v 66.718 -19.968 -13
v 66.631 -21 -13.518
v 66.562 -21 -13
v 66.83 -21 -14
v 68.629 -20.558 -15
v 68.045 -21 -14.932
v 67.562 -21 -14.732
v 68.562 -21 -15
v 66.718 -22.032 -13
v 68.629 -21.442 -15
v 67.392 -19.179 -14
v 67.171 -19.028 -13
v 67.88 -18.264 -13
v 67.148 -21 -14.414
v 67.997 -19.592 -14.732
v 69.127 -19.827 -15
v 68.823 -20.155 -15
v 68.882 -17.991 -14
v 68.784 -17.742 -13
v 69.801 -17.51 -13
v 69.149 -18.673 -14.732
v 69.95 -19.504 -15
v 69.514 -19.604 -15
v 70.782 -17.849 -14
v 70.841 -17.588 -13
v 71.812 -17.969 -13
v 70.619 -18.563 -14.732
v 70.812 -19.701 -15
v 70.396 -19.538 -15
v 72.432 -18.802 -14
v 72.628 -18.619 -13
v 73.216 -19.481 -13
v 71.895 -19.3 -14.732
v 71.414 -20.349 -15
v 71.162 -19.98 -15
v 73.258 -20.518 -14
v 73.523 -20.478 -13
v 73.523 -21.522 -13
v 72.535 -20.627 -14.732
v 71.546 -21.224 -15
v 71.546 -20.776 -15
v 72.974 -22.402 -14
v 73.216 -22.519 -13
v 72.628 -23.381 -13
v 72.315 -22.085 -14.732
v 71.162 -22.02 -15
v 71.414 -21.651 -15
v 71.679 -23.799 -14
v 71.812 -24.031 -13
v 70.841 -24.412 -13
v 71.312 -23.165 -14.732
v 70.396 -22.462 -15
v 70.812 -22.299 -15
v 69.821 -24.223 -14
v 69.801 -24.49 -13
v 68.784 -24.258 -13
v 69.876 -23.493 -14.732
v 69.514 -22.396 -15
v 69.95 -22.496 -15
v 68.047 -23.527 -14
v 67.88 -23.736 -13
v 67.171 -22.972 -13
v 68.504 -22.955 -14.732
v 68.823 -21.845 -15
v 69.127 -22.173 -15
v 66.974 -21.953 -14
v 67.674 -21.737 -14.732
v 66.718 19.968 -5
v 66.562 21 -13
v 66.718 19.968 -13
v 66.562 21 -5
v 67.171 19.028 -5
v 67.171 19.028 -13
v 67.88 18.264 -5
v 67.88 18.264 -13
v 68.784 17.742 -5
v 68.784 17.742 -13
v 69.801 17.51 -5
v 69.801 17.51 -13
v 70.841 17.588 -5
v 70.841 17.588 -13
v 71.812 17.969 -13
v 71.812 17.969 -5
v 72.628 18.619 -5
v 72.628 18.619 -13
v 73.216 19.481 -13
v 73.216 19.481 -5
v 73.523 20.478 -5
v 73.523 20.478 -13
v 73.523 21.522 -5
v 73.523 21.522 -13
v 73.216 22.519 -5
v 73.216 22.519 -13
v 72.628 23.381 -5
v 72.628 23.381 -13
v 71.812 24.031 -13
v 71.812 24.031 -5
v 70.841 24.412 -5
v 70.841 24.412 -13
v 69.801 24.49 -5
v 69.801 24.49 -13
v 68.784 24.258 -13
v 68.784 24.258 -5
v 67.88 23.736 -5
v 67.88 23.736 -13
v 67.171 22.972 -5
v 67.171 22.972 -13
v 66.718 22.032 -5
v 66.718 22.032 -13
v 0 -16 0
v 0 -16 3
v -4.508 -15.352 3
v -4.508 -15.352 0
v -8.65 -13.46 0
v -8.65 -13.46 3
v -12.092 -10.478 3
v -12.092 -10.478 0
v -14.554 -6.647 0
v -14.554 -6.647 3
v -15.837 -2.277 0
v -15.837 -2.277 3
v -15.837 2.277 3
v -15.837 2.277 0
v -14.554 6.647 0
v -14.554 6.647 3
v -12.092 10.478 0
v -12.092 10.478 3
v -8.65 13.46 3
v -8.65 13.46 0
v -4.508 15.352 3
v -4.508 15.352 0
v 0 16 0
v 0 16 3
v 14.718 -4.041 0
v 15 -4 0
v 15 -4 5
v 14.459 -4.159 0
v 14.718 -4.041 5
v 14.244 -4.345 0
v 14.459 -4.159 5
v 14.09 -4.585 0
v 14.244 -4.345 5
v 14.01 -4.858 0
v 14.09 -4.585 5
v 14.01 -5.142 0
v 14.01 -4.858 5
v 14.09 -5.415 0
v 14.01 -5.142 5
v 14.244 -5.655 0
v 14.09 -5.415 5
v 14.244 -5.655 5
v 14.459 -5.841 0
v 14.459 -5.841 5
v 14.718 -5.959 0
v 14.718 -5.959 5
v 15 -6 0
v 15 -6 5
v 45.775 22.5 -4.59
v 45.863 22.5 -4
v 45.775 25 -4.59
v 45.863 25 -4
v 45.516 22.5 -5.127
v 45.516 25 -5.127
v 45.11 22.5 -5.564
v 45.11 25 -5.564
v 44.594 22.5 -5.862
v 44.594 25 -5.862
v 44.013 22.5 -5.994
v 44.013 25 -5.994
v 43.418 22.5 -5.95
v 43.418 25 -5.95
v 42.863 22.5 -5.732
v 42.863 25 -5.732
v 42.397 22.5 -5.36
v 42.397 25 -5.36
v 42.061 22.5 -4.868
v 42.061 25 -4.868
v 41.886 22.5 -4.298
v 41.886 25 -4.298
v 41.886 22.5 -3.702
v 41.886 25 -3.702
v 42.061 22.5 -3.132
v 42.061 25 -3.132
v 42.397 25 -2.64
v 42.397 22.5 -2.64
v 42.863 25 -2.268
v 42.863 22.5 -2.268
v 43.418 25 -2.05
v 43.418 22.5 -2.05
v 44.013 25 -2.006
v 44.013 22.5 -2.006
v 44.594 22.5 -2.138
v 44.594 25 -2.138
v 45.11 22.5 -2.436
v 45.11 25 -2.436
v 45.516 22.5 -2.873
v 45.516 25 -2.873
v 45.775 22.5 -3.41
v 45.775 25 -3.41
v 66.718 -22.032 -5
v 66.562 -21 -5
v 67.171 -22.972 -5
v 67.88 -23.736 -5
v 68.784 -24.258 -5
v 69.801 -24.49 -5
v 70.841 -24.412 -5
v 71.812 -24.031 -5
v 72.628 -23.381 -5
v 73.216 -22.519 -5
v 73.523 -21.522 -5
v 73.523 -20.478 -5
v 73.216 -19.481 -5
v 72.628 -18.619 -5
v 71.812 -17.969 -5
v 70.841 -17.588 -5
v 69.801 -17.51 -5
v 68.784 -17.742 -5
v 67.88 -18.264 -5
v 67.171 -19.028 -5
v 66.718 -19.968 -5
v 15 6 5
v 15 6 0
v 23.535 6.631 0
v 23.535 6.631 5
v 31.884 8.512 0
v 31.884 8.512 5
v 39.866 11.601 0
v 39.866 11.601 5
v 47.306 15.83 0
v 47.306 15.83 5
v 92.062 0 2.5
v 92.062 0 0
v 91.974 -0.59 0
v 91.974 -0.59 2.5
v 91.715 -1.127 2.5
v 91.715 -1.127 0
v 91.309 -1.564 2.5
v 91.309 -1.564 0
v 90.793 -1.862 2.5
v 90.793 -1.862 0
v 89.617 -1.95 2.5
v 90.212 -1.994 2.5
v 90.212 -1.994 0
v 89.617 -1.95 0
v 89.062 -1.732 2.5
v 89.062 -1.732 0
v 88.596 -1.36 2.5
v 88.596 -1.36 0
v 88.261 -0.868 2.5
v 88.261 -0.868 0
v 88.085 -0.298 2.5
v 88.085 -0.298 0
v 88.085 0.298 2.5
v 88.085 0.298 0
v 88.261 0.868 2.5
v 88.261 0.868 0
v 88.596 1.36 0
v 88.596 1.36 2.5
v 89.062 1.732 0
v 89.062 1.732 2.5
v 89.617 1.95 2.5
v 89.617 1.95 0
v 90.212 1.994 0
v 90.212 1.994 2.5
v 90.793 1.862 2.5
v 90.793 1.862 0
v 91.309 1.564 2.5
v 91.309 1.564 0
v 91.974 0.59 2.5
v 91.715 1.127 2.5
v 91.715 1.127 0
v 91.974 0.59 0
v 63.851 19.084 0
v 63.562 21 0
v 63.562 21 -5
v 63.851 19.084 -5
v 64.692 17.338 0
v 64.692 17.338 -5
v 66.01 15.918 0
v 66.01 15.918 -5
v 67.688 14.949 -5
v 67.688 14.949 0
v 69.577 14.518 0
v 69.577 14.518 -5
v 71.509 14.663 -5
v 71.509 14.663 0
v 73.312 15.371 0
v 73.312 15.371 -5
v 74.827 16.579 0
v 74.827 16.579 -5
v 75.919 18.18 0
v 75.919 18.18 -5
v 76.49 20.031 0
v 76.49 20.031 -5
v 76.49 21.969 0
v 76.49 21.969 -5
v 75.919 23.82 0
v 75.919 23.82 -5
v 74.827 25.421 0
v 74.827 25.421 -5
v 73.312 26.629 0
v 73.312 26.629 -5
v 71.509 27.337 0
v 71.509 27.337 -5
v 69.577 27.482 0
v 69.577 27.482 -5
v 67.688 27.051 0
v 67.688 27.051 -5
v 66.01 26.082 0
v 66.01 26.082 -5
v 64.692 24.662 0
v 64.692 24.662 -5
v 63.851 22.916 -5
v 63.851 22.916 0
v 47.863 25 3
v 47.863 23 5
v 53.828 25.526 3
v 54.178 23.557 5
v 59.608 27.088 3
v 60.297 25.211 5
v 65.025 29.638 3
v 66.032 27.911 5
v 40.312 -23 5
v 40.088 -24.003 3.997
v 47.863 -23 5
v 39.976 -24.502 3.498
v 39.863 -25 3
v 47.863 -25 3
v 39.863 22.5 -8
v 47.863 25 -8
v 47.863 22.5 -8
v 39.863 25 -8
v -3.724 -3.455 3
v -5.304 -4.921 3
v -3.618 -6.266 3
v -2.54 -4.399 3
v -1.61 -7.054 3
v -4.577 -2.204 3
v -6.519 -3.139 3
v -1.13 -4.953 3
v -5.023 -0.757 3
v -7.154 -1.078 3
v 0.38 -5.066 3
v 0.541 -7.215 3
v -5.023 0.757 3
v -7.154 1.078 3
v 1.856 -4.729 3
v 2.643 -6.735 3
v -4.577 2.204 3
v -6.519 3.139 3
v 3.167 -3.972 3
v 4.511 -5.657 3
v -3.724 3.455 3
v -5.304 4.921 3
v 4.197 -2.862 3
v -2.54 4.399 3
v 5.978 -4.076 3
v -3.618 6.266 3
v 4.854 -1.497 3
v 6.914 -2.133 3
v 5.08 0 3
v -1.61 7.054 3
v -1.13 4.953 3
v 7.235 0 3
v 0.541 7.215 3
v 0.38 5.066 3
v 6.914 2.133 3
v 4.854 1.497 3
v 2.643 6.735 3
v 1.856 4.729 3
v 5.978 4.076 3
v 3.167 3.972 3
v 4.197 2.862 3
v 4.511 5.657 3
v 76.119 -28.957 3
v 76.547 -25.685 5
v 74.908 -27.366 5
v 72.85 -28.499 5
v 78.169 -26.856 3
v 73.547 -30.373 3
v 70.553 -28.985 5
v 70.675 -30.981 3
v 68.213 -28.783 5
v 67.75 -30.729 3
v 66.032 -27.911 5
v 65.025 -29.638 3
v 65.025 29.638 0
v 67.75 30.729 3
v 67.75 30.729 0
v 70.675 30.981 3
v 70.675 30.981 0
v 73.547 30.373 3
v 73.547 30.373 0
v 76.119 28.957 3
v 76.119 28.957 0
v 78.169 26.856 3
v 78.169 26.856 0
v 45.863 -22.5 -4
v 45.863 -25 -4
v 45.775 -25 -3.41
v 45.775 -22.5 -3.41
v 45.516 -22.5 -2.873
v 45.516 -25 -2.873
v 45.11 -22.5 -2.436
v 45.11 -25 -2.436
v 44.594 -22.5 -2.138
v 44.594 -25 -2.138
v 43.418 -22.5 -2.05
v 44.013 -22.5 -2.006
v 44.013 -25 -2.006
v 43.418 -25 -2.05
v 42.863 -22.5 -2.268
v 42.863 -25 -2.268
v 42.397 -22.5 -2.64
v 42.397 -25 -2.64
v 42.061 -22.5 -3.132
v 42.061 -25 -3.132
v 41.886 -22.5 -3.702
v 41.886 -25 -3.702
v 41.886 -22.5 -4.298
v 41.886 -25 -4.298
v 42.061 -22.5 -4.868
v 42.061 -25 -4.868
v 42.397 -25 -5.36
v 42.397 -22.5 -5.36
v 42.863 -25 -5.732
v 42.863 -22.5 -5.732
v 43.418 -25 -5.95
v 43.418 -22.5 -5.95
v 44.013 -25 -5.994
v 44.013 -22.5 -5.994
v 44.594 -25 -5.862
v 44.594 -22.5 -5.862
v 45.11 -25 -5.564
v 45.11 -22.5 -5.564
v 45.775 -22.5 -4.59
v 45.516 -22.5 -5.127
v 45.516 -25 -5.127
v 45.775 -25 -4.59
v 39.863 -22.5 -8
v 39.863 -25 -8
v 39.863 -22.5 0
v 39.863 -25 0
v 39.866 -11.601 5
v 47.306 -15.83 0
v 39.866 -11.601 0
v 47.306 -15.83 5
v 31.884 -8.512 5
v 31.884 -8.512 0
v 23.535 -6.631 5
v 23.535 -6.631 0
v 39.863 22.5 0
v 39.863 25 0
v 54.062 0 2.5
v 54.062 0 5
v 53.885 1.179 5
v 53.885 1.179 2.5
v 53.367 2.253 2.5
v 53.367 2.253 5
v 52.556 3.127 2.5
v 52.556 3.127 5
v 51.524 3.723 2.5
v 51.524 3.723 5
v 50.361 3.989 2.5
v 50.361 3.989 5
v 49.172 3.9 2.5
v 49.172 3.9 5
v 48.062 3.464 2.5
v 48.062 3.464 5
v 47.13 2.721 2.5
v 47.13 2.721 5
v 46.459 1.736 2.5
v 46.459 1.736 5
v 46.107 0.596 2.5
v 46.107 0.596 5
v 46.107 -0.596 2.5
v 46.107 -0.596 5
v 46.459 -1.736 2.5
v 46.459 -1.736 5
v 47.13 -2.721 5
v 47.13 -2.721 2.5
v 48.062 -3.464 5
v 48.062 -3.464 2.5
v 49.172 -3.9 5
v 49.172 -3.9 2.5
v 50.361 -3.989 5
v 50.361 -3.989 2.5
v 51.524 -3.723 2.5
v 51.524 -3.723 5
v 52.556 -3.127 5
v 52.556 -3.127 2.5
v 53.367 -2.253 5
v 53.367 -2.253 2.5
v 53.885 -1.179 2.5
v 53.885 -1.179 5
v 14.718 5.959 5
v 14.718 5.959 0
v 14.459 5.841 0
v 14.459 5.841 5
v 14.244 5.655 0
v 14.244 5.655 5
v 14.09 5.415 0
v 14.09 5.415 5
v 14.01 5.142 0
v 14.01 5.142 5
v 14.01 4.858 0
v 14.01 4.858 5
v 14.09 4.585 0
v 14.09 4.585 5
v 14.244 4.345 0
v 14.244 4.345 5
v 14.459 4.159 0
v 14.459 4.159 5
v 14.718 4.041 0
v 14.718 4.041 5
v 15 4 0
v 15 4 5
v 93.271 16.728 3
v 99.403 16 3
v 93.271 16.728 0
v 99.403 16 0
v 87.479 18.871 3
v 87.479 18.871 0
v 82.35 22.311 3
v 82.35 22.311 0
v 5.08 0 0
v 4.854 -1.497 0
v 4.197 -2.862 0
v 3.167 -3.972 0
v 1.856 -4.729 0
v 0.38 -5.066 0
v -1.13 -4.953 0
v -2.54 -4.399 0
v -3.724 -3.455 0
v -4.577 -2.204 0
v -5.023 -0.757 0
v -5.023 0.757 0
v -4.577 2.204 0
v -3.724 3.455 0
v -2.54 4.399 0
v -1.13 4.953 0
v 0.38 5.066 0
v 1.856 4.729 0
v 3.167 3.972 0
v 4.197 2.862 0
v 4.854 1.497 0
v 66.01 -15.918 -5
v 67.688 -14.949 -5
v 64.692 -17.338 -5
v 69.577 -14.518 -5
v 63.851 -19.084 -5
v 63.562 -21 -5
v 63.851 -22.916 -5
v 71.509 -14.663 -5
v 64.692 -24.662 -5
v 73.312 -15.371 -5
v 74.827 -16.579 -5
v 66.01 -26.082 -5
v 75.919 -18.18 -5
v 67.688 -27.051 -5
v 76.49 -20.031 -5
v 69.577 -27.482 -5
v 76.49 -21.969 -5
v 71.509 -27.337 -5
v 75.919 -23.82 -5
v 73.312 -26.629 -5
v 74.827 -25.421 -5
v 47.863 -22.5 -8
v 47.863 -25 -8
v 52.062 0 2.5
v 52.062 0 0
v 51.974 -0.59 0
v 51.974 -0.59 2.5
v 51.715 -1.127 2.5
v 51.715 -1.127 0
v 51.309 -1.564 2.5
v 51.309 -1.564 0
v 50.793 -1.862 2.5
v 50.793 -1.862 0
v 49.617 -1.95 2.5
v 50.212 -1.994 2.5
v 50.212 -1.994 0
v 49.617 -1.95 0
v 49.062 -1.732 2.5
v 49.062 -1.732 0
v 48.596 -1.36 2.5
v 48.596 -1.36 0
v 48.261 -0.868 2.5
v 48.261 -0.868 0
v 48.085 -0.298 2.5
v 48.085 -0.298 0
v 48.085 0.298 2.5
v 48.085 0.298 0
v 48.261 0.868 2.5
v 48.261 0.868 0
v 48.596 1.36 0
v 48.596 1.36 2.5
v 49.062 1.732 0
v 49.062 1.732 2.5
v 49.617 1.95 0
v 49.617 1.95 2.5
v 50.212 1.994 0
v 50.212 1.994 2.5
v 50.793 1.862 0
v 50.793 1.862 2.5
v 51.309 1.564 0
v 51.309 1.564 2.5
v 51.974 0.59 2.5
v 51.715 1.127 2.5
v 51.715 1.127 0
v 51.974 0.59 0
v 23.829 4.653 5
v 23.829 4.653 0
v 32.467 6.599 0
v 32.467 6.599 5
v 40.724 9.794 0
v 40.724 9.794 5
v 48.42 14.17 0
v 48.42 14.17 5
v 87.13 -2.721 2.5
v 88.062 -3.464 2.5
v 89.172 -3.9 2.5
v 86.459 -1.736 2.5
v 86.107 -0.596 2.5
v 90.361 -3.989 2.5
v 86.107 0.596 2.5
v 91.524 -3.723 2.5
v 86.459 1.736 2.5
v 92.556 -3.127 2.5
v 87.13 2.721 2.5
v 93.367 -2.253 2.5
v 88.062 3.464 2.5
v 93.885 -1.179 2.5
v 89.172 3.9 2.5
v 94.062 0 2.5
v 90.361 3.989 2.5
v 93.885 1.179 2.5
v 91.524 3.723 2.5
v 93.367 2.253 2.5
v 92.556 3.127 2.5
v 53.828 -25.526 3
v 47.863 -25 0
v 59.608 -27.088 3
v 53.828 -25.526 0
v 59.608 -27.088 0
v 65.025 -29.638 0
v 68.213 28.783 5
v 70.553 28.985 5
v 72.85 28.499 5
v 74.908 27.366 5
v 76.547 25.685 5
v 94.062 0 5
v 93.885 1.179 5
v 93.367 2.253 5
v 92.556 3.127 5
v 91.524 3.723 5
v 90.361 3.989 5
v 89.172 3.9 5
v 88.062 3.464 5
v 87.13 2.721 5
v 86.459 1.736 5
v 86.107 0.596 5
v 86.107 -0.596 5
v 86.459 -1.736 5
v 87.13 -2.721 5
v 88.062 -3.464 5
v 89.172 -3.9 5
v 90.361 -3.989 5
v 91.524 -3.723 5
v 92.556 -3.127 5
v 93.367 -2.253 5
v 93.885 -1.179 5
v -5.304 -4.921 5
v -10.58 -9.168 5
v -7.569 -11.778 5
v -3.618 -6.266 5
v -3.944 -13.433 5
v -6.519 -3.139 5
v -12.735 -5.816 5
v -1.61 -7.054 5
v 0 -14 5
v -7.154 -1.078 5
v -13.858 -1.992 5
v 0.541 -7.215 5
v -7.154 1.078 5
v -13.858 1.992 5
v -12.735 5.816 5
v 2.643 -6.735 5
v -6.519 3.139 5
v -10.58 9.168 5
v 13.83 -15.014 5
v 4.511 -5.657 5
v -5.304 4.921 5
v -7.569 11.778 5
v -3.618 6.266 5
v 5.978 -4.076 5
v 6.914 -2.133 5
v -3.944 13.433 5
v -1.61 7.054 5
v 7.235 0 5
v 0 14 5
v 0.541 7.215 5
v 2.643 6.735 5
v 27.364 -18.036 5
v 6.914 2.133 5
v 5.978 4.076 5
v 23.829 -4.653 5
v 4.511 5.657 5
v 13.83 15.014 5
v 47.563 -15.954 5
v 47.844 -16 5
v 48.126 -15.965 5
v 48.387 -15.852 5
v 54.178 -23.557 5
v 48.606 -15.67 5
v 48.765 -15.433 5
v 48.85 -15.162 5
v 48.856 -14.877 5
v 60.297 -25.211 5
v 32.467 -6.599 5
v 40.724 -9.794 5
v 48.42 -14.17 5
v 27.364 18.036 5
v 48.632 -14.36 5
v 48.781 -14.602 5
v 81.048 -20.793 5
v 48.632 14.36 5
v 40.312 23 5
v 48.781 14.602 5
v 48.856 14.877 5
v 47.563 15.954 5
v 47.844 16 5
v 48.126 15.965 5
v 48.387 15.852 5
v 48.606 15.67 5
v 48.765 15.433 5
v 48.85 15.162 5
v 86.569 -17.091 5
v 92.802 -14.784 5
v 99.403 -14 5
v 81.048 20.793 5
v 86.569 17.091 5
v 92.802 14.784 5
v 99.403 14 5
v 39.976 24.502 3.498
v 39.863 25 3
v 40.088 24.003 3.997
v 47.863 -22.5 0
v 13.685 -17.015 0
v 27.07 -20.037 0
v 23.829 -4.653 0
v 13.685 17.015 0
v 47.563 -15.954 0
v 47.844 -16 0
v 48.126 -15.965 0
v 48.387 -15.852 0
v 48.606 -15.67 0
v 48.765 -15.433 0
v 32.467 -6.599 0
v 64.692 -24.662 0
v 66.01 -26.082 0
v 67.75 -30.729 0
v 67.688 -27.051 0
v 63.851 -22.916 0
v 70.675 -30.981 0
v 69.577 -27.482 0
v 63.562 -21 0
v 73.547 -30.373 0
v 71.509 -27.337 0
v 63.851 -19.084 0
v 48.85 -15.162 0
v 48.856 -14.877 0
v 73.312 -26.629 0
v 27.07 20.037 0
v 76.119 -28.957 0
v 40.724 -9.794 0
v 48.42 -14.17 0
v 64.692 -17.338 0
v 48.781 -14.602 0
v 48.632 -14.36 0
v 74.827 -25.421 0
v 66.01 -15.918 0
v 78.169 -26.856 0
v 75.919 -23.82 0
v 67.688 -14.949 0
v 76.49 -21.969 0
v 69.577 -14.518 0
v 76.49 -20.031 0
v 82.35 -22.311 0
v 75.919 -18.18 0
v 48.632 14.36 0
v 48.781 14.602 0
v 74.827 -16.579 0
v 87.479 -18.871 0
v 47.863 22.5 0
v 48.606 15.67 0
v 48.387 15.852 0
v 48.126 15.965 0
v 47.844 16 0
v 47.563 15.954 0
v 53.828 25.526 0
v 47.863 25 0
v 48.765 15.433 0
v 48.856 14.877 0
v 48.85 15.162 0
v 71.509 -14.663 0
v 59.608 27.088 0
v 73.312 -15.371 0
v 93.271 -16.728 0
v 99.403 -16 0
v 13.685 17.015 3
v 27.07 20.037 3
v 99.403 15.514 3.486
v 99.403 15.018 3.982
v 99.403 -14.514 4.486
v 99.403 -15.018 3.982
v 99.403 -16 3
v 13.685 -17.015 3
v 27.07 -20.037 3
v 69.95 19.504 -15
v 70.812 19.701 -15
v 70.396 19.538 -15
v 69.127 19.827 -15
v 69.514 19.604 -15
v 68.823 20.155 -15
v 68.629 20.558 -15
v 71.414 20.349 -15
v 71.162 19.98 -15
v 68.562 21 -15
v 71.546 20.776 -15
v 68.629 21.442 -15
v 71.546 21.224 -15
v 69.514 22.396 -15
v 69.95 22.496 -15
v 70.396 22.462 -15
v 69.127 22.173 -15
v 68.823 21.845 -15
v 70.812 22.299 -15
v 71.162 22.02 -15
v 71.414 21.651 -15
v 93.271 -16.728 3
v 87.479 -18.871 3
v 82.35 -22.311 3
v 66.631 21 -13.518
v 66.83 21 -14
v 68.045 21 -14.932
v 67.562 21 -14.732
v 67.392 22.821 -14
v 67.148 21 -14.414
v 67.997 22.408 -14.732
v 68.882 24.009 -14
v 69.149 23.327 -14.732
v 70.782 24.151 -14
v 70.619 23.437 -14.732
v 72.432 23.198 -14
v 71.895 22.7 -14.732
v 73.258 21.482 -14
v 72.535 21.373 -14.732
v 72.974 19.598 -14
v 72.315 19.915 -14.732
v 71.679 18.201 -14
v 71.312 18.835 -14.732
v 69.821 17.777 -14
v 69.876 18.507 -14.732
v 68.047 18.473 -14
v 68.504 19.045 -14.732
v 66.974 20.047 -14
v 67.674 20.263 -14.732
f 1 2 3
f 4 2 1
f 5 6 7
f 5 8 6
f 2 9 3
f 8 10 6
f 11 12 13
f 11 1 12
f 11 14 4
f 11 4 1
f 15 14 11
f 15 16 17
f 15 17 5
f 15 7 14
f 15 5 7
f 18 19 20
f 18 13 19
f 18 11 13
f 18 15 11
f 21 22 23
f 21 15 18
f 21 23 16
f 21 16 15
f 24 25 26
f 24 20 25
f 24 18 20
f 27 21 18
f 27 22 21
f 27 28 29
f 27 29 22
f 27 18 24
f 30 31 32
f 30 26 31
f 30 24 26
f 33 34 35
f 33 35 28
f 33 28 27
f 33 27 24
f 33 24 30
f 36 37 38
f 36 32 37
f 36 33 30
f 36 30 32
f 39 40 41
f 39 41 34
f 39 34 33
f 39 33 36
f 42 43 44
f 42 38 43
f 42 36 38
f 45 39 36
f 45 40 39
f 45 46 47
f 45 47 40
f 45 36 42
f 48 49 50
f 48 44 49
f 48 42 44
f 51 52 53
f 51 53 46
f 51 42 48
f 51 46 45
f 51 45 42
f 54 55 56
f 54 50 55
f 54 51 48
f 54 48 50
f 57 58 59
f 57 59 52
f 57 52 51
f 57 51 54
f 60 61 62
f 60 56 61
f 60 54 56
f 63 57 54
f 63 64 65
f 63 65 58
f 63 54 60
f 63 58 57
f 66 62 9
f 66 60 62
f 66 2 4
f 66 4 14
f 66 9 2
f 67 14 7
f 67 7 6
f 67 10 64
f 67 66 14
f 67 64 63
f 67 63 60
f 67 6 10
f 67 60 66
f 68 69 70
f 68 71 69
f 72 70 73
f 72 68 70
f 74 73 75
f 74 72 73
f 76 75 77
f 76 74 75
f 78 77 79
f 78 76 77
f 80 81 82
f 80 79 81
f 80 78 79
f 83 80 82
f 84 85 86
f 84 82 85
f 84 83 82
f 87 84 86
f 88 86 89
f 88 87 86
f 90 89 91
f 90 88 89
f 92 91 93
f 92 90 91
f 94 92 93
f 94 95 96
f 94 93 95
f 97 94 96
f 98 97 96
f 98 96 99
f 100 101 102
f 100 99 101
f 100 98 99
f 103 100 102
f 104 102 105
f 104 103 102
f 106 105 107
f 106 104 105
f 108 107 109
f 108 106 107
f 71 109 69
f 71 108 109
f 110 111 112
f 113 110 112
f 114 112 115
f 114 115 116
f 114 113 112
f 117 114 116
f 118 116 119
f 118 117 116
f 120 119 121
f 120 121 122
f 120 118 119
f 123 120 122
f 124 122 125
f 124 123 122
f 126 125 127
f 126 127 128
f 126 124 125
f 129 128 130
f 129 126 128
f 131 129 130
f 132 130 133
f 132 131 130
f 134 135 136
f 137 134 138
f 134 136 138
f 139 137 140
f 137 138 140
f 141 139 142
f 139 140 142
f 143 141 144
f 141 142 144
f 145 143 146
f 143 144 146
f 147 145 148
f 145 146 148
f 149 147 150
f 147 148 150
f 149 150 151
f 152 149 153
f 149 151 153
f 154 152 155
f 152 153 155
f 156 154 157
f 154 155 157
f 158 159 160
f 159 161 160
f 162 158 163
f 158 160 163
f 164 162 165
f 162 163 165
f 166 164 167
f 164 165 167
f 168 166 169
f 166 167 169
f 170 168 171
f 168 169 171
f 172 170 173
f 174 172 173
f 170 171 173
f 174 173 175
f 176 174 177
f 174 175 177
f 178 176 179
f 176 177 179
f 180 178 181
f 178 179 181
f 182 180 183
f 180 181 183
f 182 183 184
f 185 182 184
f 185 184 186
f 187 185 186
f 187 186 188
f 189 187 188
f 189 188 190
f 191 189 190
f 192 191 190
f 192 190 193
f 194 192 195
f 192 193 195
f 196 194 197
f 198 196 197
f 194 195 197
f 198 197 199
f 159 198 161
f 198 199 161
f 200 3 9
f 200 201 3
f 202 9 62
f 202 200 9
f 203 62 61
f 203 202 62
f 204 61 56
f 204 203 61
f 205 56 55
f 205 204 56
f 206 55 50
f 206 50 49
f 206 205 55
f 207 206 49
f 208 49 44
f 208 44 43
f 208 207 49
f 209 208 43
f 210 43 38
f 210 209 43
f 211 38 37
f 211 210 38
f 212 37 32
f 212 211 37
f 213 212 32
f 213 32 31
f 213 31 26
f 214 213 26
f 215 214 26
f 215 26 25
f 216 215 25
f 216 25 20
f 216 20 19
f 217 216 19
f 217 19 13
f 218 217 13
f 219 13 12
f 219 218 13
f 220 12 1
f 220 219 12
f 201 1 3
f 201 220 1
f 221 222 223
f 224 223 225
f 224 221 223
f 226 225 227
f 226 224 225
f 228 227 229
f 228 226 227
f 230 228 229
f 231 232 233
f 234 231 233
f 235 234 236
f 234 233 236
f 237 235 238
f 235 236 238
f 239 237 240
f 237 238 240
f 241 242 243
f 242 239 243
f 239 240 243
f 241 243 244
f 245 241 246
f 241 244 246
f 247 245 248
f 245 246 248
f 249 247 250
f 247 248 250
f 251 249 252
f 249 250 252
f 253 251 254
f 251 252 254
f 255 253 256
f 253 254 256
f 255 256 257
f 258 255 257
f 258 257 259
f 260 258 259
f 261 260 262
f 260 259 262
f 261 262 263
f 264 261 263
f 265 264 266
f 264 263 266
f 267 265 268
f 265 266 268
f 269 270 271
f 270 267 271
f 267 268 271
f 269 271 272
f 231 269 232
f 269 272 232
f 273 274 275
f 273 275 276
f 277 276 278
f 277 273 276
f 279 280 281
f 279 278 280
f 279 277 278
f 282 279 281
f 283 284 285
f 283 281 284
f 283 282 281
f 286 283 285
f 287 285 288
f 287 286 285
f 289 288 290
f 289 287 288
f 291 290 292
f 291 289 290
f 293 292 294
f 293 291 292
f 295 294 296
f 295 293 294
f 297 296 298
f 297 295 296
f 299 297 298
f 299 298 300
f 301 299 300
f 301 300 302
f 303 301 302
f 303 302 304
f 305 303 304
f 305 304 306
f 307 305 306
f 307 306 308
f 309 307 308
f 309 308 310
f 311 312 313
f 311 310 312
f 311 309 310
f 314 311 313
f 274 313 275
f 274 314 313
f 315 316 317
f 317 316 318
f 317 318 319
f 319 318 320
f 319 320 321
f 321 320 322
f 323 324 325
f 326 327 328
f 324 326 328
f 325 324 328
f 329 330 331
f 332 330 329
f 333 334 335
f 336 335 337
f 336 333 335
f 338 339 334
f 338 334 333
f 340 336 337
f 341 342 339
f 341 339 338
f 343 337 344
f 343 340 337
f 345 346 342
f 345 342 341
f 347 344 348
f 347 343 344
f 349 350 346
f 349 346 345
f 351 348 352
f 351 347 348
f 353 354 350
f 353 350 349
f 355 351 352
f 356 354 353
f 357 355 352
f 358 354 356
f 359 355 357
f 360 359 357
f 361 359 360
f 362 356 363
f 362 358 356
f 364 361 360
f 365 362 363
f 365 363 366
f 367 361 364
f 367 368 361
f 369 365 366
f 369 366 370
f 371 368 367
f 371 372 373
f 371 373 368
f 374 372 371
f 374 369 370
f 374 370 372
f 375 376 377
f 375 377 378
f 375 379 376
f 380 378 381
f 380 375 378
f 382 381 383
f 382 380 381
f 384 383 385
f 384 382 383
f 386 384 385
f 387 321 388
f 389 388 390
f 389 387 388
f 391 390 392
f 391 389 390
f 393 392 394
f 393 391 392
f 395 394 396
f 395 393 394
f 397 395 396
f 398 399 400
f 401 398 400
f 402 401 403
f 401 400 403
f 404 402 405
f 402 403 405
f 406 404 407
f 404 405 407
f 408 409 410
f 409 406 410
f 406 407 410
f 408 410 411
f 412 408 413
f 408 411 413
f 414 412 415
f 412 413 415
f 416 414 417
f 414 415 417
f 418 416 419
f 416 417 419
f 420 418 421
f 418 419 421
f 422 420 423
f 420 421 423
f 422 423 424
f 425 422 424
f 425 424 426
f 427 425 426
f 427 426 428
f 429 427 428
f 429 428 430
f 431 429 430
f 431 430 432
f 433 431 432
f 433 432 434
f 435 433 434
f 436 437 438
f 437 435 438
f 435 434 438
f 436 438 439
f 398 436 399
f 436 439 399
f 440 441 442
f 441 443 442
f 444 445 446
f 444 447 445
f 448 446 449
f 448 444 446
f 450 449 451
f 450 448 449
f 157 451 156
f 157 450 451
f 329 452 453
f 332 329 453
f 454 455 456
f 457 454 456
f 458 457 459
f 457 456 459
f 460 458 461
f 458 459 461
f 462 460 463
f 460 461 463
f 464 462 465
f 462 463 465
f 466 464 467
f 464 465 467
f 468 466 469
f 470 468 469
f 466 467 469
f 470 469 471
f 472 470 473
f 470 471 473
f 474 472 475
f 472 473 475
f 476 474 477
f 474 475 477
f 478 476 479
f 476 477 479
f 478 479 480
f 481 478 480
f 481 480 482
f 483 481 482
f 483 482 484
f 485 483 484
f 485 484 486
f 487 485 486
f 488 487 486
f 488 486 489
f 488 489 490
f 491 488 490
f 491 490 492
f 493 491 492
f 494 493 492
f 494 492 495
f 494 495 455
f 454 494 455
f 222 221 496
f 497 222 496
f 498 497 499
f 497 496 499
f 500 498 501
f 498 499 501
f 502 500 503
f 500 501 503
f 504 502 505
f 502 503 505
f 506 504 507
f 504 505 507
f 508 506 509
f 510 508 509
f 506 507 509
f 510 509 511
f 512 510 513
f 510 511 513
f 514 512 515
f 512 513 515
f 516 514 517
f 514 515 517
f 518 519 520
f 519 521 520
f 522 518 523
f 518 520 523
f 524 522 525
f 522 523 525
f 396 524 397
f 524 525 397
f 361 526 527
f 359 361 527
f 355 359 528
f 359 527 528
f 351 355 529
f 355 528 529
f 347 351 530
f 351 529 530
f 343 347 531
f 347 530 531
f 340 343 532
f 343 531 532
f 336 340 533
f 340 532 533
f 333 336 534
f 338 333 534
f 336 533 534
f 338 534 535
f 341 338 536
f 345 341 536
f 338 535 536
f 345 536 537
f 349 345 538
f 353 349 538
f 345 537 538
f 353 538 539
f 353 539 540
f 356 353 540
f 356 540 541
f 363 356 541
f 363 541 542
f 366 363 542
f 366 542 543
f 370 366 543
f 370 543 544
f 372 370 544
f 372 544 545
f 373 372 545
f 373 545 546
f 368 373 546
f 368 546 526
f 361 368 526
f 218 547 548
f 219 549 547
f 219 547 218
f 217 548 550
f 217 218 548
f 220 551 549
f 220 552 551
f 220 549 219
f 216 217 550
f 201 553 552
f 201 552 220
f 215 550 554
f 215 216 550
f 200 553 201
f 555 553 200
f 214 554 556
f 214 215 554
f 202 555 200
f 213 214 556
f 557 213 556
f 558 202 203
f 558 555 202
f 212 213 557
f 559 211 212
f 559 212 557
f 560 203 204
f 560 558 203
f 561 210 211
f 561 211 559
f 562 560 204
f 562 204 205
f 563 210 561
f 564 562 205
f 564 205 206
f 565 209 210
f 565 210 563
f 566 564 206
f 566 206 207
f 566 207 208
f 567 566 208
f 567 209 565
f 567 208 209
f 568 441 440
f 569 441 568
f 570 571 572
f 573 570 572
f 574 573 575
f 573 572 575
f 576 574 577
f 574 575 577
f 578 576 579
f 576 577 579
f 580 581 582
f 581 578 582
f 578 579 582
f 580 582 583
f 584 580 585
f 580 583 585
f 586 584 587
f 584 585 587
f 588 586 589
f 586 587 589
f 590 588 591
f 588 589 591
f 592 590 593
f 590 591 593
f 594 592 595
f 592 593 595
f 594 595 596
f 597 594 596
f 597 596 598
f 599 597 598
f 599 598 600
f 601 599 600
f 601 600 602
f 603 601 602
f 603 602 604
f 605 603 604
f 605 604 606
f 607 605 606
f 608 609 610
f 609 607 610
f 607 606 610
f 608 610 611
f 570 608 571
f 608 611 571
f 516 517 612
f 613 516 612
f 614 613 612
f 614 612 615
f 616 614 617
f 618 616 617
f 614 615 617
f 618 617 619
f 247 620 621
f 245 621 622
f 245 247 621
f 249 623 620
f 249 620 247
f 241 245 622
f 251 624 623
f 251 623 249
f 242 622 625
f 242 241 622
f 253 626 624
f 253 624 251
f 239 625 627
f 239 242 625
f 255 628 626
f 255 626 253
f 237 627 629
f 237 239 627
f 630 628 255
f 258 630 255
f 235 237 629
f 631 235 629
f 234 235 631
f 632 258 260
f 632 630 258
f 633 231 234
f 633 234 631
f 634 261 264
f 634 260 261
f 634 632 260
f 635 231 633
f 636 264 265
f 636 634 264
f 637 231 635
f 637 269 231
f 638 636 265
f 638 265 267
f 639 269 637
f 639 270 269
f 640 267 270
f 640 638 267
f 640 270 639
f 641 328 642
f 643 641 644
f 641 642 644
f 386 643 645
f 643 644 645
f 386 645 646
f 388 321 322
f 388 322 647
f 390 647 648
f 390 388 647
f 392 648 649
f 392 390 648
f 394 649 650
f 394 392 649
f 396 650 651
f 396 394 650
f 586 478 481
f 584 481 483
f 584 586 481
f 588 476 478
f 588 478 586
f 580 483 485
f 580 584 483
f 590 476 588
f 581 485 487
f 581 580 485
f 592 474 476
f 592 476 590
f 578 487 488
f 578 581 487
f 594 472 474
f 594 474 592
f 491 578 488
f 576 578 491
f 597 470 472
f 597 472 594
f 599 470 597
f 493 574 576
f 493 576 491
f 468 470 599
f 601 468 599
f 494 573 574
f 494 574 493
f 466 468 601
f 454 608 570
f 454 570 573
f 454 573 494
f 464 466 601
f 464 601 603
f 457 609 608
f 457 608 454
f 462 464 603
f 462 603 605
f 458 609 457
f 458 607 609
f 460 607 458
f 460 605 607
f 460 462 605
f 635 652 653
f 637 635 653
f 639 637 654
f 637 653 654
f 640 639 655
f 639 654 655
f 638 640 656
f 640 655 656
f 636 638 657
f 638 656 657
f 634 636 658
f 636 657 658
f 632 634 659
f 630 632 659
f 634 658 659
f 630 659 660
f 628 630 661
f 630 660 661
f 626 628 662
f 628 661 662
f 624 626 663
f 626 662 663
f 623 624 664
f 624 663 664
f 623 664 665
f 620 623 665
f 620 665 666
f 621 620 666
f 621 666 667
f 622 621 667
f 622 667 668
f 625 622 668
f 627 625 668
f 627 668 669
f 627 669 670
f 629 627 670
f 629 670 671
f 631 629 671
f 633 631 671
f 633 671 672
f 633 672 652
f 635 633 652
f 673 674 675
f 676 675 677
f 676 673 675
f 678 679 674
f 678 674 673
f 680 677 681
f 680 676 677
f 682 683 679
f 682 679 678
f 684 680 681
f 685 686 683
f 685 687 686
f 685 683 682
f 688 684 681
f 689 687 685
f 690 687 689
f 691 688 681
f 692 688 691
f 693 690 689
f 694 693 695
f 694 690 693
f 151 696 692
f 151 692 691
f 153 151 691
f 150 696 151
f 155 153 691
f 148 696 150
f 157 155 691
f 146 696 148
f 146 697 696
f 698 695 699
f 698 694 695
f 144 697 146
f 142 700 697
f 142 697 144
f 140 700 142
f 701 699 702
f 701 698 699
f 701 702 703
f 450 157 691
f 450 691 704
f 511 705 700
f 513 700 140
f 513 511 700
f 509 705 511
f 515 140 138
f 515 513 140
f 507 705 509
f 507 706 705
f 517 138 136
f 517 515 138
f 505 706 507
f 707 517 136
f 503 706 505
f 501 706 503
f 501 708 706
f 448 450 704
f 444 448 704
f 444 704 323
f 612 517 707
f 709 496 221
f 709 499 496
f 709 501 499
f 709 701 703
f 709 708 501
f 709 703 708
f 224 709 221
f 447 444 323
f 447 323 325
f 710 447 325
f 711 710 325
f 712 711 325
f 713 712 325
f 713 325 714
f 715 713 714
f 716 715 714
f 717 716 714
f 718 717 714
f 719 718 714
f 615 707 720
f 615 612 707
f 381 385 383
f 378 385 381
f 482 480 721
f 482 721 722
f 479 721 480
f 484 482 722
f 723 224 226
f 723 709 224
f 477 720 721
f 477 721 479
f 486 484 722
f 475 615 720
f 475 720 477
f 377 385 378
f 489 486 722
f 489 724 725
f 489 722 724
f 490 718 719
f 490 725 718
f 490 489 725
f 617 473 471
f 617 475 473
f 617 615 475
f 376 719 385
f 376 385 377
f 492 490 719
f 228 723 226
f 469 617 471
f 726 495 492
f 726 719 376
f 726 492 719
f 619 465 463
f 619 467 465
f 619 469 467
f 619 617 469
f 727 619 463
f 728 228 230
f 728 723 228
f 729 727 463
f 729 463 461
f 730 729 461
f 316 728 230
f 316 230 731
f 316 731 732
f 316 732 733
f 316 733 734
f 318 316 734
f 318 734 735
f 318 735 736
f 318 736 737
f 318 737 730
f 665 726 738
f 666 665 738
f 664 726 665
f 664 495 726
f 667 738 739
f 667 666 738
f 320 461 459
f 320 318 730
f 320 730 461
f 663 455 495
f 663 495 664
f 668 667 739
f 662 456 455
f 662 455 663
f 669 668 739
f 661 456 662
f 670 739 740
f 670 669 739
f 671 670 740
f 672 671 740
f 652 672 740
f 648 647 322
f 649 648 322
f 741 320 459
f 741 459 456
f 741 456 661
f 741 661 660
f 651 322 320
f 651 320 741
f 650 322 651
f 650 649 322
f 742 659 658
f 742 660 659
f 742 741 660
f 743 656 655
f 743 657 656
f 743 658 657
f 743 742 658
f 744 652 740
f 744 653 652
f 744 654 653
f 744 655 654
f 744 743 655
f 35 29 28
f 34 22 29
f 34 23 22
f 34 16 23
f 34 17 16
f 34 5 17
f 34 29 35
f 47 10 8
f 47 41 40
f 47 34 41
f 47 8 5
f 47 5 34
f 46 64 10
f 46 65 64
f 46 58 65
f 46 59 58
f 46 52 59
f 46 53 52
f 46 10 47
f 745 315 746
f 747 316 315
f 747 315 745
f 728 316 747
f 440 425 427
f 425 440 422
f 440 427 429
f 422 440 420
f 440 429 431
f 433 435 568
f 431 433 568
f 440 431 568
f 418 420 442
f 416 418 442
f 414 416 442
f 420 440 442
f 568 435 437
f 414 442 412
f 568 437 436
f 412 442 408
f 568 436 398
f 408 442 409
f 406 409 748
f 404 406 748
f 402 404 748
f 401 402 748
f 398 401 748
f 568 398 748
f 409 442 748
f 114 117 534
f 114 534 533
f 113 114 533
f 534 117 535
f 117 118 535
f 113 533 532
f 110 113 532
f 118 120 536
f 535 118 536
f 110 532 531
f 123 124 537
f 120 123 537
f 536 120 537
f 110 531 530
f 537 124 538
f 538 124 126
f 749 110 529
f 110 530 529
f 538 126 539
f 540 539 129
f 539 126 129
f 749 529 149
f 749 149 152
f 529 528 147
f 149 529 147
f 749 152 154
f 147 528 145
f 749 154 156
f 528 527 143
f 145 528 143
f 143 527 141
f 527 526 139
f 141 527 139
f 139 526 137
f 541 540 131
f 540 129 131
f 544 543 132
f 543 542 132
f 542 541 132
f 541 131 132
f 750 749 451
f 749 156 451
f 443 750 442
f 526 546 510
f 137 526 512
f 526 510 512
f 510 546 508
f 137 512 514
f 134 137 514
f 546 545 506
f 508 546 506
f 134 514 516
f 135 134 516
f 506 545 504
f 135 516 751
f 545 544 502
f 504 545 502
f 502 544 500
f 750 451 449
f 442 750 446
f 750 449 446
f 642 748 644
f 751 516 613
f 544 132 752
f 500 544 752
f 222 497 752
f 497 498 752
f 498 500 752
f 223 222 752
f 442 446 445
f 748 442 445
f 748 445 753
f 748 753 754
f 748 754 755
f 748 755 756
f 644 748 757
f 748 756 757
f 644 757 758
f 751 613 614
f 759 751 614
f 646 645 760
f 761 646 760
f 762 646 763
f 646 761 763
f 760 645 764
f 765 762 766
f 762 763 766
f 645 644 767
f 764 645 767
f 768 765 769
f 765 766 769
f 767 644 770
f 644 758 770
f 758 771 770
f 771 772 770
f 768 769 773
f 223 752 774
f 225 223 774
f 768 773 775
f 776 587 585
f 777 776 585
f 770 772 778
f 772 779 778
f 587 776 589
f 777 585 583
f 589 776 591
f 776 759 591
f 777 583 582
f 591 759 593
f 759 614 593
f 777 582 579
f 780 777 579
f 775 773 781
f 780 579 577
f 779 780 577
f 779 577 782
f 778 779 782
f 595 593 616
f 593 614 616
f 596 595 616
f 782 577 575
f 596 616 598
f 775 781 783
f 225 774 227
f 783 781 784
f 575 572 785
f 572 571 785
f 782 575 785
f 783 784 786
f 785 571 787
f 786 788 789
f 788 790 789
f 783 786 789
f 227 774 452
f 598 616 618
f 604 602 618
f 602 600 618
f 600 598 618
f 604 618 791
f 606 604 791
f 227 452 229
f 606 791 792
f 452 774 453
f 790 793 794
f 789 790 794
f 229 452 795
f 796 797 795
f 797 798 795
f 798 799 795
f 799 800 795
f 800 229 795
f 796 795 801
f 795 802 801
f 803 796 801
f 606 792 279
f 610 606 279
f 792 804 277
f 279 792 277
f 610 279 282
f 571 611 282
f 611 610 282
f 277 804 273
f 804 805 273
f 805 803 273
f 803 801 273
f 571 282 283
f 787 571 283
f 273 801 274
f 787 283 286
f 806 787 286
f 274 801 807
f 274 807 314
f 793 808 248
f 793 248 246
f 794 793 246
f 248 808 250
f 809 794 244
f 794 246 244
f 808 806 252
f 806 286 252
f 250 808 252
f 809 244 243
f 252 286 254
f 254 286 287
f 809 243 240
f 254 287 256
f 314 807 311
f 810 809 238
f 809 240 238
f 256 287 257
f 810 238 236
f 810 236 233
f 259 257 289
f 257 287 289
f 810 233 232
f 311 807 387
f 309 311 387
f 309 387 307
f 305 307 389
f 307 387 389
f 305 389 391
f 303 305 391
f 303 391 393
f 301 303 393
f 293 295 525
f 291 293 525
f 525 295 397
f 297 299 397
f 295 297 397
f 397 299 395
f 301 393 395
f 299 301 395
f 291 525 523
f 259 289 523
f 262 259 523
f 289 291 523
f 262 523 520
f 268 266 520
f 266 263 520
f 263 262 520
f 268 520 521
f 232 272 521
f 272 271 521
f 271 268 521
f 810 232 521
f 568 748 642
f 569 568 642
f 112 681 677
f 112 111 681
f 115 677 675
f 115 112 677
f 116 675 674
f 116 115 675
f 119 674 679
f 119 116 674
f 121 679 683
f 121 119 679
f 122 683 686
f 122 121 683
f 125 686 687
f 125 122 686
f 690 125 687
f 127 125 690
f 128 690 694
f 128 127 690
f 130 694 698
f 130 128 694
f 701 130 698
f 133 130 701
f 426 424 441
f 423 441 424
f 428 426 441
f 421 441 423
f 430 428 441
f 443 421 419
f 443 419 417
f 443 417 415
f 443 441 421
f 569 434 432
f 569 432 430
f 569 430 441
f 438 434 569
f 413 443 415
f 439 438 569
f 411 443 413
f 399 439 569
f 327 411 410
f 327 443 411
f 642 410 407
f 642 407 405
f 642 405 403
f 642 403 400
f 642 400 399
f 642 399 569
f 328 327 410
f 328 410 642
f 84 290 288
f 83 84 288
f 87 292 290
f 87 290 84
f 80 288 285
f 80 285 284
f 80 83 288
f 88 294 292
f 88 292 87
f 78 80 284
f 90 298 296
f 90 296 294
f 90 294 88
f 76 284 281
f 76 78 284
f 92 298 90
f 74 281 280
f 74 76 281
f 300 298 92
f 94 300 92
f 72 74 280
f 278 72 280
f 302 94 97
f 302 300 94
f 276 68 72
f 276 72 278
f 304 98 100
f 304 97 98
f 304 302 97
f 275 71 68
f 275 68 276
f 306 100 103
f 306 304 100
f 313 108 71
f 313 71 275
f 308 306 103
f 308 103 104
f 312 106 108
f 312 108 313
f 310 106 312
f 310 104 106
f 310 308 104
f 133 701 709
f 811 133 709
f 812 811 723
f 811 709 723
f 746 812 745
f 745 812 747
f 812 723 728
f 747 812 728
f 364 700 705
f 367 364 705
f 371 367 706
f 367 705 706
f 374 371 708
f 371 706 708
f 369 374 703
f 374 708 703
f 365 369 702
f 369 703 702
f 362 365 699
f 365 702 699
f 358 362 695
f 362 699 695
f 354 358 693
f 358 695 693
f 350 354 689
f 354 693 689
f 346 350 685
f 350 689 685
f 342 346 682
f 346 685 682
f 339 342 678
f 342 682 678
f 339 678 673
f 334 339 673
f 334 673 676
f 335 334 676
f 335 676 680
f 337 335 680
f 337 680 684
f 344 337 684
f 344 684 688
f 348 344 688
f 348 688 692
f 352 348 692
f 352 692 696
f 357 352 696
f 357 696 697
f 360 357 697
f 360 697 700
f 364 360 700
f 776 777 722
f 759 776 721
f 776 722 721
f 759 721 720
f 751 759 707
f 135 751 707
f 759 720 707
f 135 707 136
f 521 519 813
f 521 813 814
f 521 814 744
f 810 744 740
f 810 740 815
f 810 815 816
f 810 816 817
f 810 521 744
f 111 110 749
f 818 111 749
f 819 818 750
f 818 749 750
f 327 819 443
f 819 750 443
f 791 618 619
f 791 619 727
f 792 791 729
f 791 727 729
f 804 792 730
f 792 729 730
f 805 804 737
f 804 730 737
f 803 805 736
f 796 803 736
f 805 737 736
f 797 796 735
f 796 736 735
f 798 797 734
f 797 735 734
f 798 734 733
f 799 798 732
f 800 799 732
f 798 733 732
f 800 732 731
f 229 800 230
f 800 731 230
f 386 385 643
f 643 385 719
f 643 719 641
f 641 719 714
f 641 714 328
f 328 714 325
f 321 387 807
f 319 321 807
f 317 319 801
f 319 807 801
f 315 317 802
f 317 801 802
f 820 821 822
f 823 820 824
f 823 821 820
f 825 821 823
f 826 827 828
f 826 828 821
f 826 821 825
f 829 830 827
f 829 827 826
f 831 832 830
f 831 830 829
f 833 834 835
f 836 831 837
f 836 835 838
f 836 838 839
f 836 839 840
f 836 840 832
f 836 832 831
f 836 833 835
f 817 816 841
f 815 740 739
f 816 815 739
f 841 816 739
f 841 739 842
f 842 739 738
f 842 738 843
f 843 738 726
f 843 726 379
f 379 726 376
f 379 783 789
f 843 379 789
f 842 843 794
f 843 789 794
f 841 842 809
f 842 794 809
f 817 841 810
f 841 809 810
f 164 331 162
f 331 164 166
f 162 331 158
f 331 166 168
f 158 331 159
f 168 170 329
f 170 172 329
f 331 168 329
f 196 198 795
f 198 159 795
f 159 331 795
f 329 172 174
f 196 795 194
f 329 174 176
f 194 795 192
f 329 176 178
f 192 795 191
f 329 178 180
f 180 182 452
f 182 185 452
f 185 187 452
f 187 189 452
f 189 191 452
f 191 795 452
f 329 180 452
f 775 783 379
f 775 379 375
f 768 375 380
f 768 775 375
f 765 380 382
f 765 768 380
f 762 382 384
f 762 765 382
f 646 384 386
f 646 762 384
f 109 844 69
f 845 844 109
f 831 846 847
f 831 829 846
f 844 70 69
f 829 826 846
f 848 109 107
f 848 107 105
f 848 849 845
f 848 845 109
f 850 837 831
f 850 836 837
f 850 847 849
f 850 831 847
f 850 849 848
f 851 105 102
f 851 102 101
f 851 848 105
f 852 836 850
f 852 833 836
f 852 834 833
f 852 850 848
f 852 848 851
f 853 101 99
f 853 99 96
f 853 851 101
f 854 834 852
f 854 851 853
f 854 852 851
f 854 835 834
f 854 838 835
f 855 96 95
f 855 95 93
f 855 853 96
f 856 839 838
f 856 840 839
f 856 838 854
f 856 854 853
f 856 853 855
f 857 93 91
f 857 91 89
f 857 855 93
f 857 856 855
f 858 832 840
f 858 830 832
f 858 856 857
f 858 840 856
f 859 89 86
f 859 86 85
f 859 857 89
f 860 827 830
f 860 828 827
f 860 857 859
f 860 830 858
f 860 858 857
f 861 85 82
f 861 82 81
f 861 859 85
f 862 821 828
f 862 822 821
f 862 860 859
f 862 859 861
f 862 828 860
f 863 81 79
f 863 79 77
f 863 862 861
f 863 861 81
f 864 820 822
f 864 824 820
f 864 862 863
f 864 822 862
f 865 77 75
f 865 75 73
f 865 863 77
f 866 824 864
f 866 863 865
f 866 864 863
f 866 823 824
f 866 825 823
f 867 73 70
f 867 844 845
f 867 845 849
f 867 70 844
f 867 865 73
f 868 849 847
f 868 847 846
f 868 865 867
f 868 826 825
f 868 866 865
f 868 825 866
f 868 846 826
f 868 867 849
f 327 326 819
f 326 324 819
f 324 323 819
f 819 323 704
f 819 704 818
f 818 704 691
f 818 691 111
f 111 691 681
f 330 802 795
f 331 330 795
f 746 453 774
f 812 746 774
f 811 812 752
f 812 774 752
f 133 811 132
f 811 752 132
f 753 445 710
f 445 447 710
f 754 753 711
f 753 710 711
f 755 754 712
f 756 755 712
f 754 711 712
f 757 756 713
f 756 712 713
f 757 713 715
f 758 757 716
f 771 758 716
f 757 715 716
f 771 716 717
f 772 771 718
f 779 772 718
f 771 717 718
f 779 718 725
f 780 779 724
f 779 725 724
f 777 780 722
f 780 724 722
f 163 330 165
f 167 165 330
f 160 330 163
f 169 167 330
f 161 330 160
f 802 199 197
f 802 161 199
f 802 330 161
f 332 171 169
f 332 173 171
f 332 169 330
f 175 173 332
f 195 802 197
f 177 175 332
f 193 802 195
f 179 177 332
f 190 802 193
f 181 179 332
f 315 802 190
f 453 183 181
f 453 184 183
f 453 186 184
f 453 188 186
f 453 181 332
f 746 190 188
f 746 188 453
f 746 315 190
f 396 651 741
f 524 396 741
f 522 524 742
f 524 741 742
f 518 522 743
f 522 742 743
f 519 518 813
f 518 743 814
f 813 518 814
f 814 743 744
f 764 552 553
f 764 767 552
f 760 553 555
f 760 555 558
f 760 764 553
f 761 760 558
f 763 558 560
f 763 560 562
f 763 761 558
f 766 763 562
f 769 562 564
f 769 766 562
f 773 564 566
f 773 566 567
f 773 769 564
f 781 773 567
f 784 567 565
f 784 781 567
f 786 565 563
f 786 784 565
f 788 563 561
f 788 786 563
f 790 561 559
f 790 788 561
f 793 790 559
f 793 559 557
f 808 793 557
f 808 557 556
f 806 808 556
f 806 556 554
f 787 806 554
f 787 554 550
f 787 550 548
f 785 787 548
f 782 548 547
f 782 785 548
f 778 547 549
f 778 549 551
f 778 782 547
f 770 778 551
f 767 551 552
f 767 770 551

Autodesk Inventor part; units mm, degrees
ref_plane "YZ Plane" through (0, 0, 0) normal (1, 0, 0) x (0, 1, 0)
ref_plane "XZ Plane" through (0, 0, 0) normal (0, 1, 0) x (-1, 0, 0)
ref_plane "XY Plane" through (0, 0, 0) normal (0, 0, 1) x (1, 0, 0)
sketch "Sketch1" plane through (0, 0, 0) normal (0, 0, 1) x (1, 0, 0)
  circle A0 centre (0, 0) radius 5.08
  arc A1 (0, 16) -> (0, -16) centre (0, 0) ccw
  line L0 (0, 16) -> (99.4033, 16)
  line L1 (99.4033, 16) -> (99.4033, -16)
  line L2 (99.4033, -16) -> (0, -16)
  line L3 (0, -16) -> (0, 16) construction
  line L4 (39.8634, 25) -> (99.4033, 25)
  line L5 (99.4033, 25) -> (99.4033, -25)
  line L6 (99.4033, -25) -> (39.8634, -25)
  line L7 (39.8634, -25) -> (39.8634, 25)
  arc A2 (39.8634, -25) -> (0, -16) centre (0, -108.7828) ccw
  arc A3 (0, 16) -> (39.8634, 25) centre (0, 108.7828) ccw
  circle A4 centre (50.0625, 0) radius 2
  circle A5 centre (90.0625, 0) radius 2
  line L8 (-16, 0) -> (99.4033, 0) construction
  point P0 (39.8634, 0)
  dimension "d1" = 10.16
  dimension "d3" = 50
  dimension "d4" = 59.5399
  dimension "d12" = 4
  dimension "d13" = 40
  dimension "d14" = 50.0625
  dimension "d15" = 9.3408
  dimension "d44" = 16
extrude "Extrusion1" add sketch "Sketch1" along normal blind 5
ref_plane "Work Plane1" through (39.8634, 0, 0) normal (0, -1, 0) x (1, 0, 0)
sketch "Sketch4" plane through (0, 0, 5) normal (0, 0, 1) x (1, 0, 0)
  arc A0 (15, 6) -> (47.3064, 15.8305) centre (15, 64.0002) ccw
  arc A1 (15, 4) -> (48.4204, 14.1695) centre (15, 64.0002) ccw
  circle A2 centre (47.8634, 15) radius 1
  circle A3 centre (15, 5) radius 1
  arc A4 (0, 16) -> (39.8634, 25) centre (0, 108.7828) ccw projected
  line L0 (99.4033, 25) -> (39.8634, 25) projected
  line L1 (122.484, 0) -> (-39.0807, 0) projected
  line L2 (15, 4) -> (47.8634, 4) construction
  point P0 (0, 0)
  dimension "d16" = 2
  dimension "d17" = 10
  dimension "d18" = 8
  dimension "d19" = 15
  dimension "d20" = 5
extrude "Extrusion3" cut sketch "Sketch4" against normal through all
mirror "Mirror1" about plane through (39.8634, 0, 0) normal (0, -1, 0) of "Extrusion3"
sketch "Sketch5" plane through (0, 0, 0) normal (0, 0, -1) x (-1, 0, 0)
  arc A0 (-15, -4) -> (-48.4204, -14.1695) centre (-15, -64.0002) ccw projected
  arc A1 (-15, -6) -> (-15, -4) centre (-15, -5) ccw projected
  arc A2 (-15, -6) -> (-47.3064, -15.8305) centre (-15, -64.0002) ccw projected
  arc A3 (-48.4204, -14.1695) -> (-47.3064, -15.8305) centre (-47.8634, -15) ccw projected
  arc A4 (-47.3064, 15.8305) -> (-15, 6) centre (-15, 64.0002) ccw projected
  arc A5 (-15, 4) -> (-15, 6) centre (-15, 5) ccw projected
  arc A6 (-48.4204, 14.1695) -> (-15, 4) centre (-15, 64.0002) ccw projected
  arc A7 (-47.3064, 15.8305) -> (-48.4204, 14.1695) centre (-47.8634, 15) ccw projected
  arc A8 (0, -16) -> (0, 16) centre (0, 0) ccw projected
  arc A9 (-39.8634, 25) -> (0, 16) centre (0, 108.7828) ccw projected
  line L0 (-99.4033, 25) -> (-39.8634, 25) projected
  line L1 (-99.4033, -25) -> (-99.4033, 25) projected
  line L2 (-39.8634, -25) -> (-99.4033, -25) projected
  arc A10 (0, -16) -> (-39.8634, -25) centre (0, -108.7828) ccw projected
  circle A11 centre (-50.0625, 0) radius 2 projected
  circle A12 centre (-90.0625, 0) radius 2 projected
  circle A13 centre (0, 0) radius 5.08 projected
  line L3 (-39.8634, 25) -> (-47.8634, 25)
  line L4 (-47.8634, 25) -> (-47.8634, 22.5)
  line L5 (-47.8634, 22.5) -> (-39.8634, 22.5)
  line L6 (-39.8634, 22.5) -> (-39.8634, 25)
  dimension "d23" = 8
  dimension "d24" = 2.5
extrude "Extrusion4" add sketch "Sketch5" along normal blind 8 contours L6 L5 L4 L0
sketch "Sketch6" plane through (39.8634, 25, 5) normal (0, 1, 0) x (1, 0, 0)
  line L0 (59.5399, 5) -> (8, 5) projected
  line L1 (8, 5) -> (8, 13) projected
  line L2 (0, 13) -> (8, 13) projected
  line L3 (0, 5) -> (0, 13) projected
  line L4 (0, 5) -> (0, 0) projected
  line L5 (59.5399, 0) -> (0, 0) projected
  line L6 (59.5399, 5) -> (59.5399, 0) projected
  circle A0 centre (4, 9) radius 2
  line L7 (4, 13) -> (4, 9) construction
  point P0 (-39.8634, 5)
  dimension "d27" = 4
  dimension "d28" = 4
extrude "Extrusion5" cut sketch "Sketch6" against normal up to next contours A0
mirror "Mirror2" about plane through (39.8634, 0, 0) normal (0, -1, 0) of "Extrusion4", "Extrusion5"
sketch "Sketch7" plane through (0, 0, 0) normal (0, 0, -1) x (-1, 0, 0)
  circle A0 centre (0, 0) radius 5.08 projected
  circle A1 centre (-90.0625, 0) radius 2 projected
  circle A2 centre (-50.0625, 0) radius 2 projected
  arc A3 (-47.3064, 15.8305) -> (-15, 6) centre (-15, 64.0002) ccw projected
  arc A4 (-15, 4) -> (-15, 6) centre (-15, 5) ccw projected
  arc A5 (-48.4204, 14.1695) -> (-15, 4) centre (-15, 64.0002) ccw projected
  arc A6 (-47.3064, 15.8305) -> (-48.4204, 14.1695) centre (-47.8634, 15) ccw projected
  arc A7 (-15, -4) -> (-48.4204, -14.1695) centre (-15, -64.0002) ccw projected
  arc A8 (-15, -6) -> (-15, -4) centre (-15, -5) ccw projected
  arc A9 (-15, -6) -> (-47.3064, -15.8305) centre (-15, -64.0002) ccw projected
  arc A10 (-48.4204, -14.1695) -> (-47.3064, -15.8305) centre (-47.8634, -15) ccw projected
  line L0 (-47.8634, -25) -> (-47.8634, -22.5) projected
  line L1 (-47.8634, -22.5) -> (-39.8634, -22.5) projected
  line L2 (-39.8634, -22.5) -> (-39.8634, -25) projected
  arc A11 (0, -16) -> (-39.8634, -25) centre (0, -108.7828) ccw projected
  arc A12 (0, -16) -> (0, 16) centre (0, 0) ccw projected
  arc A13 (-39.8634, 25) -> (0, 16) centre (0, 108.7828) ccw projected
  line L3 (-39.8634, 25) -> (-39.8634, 22.5) projected
  line L4 (-39.8634, 22.5) -> (-47.8634, 22.5) projected
  line L5 (-47.8634, 22.5) -> (-47.8634, 25) projected
  line L6 (-99.4033, 25) -> (-47.8634, 25) projected
  line L7 (-99.4033, -25) -> (-99.4033, 25) projected
  line L8 (-47.8634, -25) -> (-99.4033, -25) projected
  circle A14 centre (-70.0625, 21) radius 10
  arc A15 (-65.0249, 29.6384) -> (-47.8634, 25) centre (-47.8634, 59.0667) ccw
  line L9 (-99.4033, 25) -> (-47.8634, 25) projected
  line L10 (39.0807, 0) -> (-122.484, 0) projected
  line L11 (-70.0625, -25) -> (-70.0625, 21) construction
  line L12 (-90.0625, 0) -> (-50.0625, 0) construction
  line L13 (0, 16) -> (-99.4033, 16) construction
  arc A16 (-99.4033, 16) -> (-78.1686, 26.8559) centre (-99.4033, 42.1961) ccw
  point P0 (-92.2616, 25)
  point P1 (-75.1001, 29.6384)
  point P2 (-70.0625, 0)
  point P3 (-60.8973, 25)
  point P4 (-79.2277, 25)
  point P5 (-79.6415, 25)
  dimension "d31" = 20
  dimension "d32" = 21
extrude "Extrusion6" add sketch "Sketch7" against normal up to surface (5 mm away) contours L6 A14 A15 | L6 A14 | A16 A14 L6 picked at (-67.4658, 26.7505)
sketch "Sketch8" plane through (0, 0, 0) normal (0, 0, -1) x (-1, 0, 0)
  circle A0 centre (0, 0) radius 5.08 projected
  circle A1 centre (-90.0625, 0) radius 2 projected
  circle A2 centre (-50.0625, 0) radius 2 projected
  arc A3 (-47.3064, 15.8305) -> (-15, 6) centre (-15, 64.0002) ccw projected
  arc A4 (-15, 4) -> (-15, 6) centre (-15, 5) ccw projected
  arc A5 (-48.4204, 14.1695) -> (-15, 4) centre (-15, 64.0002) ccw projected
  arc A6 (-47.3064, 15.8305) -> (-48.4204, 14.1695) centre (-47.8634, 15) ccw projected
  arc A7 (-15, -4) -> (-48.4204, -14.1695) centre (-15, -64.0002) ccw projected
  arc A8 (-15, -6) -> (-15, -4) centre (-15, -5) ccw projected
  arc A9 (-15, -6) -> (-47.3064, -15.8305) centre (-15, -64.0002) ccw projected
  arc A10 (-48.4204, -14.1695) -> (-47.3064, -15.8305) centre (-47.8634, -15) ccw projected
  line L0 (-47.8634, -25) -> (-47.8634, -22.5) projected
  line L1 (-47.8634, -22.5) -> (-39.8634, -22.5) projected
  line L2 (-39.8634, -22.5) -> (-39.8634, -25) projected
  arc A11 (0, -16) -> (-39.8634, -25) centre (0, -108.7828) ccw projected
  arc A12 (0, -16) -> (0, 16) centre (0, 0) ccw projected
  arc A13 (-39.8634, 25) -> (0, 16) centre (0, 108.7828) ccw projected
  line L3 (-39.8634, 25) -> (-39.8634, 22.5) projected
  line L4 (-39.8634, 22.5) -> (-47.8634, 22.5) projected
  line L5 (-47.8634, 22.5) -> (-47.8634, 25) projected
  arc A14 (-65.0249, 29.6384) -> (-47.8634, 25) centre (-47.8634, 59.0667) ccw projected
  arc A15 (-65.0249, 29.6384) -> (-78.1686, 26.8559) centre (-70.0625, 21) ccw projected
  line L6 (-99.4033, 25) -> (-79.6415, 25) projected
  line L7 (-99.4033, -25) -> (-99.4033, 25) projected
  line L8 (-47.8634, -25) -> (-99.4033, -25) projected
  circle A16 centre (-70.0625, 21) radius 6.5
  arc A17 (-79.6415, 25) -> (-78.1686, 26.8559) centre (-99.4033, 42.1961) ccw projected
  dimension "d35" = 13
extrude "Extrusion7" add sketch "Sketch8" along normal blind 5 contours A16
sketch "Sketch9" plane through (70.0625, 21, -5) normal (0, 0, -1) x (-1, 0, 0)
  circle A0 centre (0, 0) radius 3.5
  circle A1 centre (0, 0) radius 6.5 projected
  point P0 (70.0625, -21)
  dimension "d38" = 7
extrude "Extrusion8" add sketch "Sketch9" along normal blind 10 contours A0
fillet "Fillet1" radius 2 1 edges at (73.5625, 21, -15)
extrude "Extrusion9" cut sketch "Sketch7" against normal through all contours L7 L6 A16
mirror "Mirror3" about plane through (39.8634, 0, 0) normal (0, -1, 0) of "Extrusion6", "Extrusion7", "Extrusion8", "Fillet1", "Extrusion9"
sketch "Sketch10" plane through (0, 0, 5) normal (0, 0, 1) x (1, 0, 0)
  arc A0 (48.4204, -14.1695) -> (15, -4) centre (15, -64.0002) ccw projected
  arc A1 (47.3064, -15.8305) -> (48.4204, -14.1695) centre (47.8634, -15) ccw projected
  arc A2 (47.3064, -15.8305) -> (15, -6) centre (15, -64.0002) ccw projected
  arc A3 (15, -4) -> (15, -6) centre (15, -5) ccw projected
  arc A4 (15, 6) -> (47.3064, 15.8305) centre (15, 64.0002) ccw projected
  arc A5 (48.4204, 14.1695) -> (47.3064, 15.8305) centre (47.8634, 15) ccw projected
  arc A6 (15, 4) -> (48.4204, 14.1695) centre (15, 64.0002) ccw projected
  arc A7 (15, 6) -> (15, 4) centre (15, 5) ccw projected
  arc A8 (99.4033, -16) -> (78.1686, -26.8559) centre (99.4033, -42.1961) ccw projected
  line L0 (99.4033, -16) -> (99.4033, 16) projected
  arc A9 (78.1686, 26.8559) -> (99.4033, 16) centre (99.4033, 42.1961) ccw projected
  line L1 (47.8634, 25) -> (39.8634, 25) projected
  arc A10 (78.1686, 26.8559) -> (65.0249, 29.6384) centre (70.0625, 21) ccw projected
  arc A11 (47.8634, 25) -> (65.0249, 29.6384) centre (47.8634, 59.0667) ccw projected
  arc A12 (0, 16) -> (39.8634, 25) centre (0, 108.7828) ccw projected
  arc A13 (0, 16) -> (0, -16) centre (0, 0) ccw projected
  arc A14 (39.8634, -25) -> (0, -16) centre (0, -108.7828) ccw projected
  line L2 (39.8634, -25) -> (47.8634, -25) projected
  arc A15 (65.0249, -29.6384) -> (47.8634, -25) centre (47.8634, -59.0667) ccw projected
  arc A16 (65.0249, -29.6384) -> (78.1686, -26.8559) centre (70.0625, -21) ccw projected
  circle A17 centre (50.0625, 0) radius 2 projected
  circle A18 centre (90.0625, 0) radius 2 projected
  circle A19 centre (0, 0) radius 5.08 projected
  circle A20 centre (50.0625, 0) radius 4
  circle A21 centre (90.0625, 0) radius 4
  dimension "d45" = 8
extrude "Extrusion10" cut sketch "Sketch10" against normal blind 2.5 contours A20 | A21
sketch "Sketch11" plane through (0, 0, 5) normal (0, 0, 1) x (1, 0, 0)
  circle A0 centre (0, 0) radius 7.235
  dimension "d48" = 14.47
extrude "Extrusion11" cut sketch "Sketch11" against normal blind 2
chamfer "Chamfer1" distance 2 angle 45 5 edges at (20.4334, 18.278, 5) (-16, 0, 5) (20.4334, -18.278, 5) (43.8634, 25, 5) (43.8634, -25, 5)
properties part number "Bearing_Arm_2"
